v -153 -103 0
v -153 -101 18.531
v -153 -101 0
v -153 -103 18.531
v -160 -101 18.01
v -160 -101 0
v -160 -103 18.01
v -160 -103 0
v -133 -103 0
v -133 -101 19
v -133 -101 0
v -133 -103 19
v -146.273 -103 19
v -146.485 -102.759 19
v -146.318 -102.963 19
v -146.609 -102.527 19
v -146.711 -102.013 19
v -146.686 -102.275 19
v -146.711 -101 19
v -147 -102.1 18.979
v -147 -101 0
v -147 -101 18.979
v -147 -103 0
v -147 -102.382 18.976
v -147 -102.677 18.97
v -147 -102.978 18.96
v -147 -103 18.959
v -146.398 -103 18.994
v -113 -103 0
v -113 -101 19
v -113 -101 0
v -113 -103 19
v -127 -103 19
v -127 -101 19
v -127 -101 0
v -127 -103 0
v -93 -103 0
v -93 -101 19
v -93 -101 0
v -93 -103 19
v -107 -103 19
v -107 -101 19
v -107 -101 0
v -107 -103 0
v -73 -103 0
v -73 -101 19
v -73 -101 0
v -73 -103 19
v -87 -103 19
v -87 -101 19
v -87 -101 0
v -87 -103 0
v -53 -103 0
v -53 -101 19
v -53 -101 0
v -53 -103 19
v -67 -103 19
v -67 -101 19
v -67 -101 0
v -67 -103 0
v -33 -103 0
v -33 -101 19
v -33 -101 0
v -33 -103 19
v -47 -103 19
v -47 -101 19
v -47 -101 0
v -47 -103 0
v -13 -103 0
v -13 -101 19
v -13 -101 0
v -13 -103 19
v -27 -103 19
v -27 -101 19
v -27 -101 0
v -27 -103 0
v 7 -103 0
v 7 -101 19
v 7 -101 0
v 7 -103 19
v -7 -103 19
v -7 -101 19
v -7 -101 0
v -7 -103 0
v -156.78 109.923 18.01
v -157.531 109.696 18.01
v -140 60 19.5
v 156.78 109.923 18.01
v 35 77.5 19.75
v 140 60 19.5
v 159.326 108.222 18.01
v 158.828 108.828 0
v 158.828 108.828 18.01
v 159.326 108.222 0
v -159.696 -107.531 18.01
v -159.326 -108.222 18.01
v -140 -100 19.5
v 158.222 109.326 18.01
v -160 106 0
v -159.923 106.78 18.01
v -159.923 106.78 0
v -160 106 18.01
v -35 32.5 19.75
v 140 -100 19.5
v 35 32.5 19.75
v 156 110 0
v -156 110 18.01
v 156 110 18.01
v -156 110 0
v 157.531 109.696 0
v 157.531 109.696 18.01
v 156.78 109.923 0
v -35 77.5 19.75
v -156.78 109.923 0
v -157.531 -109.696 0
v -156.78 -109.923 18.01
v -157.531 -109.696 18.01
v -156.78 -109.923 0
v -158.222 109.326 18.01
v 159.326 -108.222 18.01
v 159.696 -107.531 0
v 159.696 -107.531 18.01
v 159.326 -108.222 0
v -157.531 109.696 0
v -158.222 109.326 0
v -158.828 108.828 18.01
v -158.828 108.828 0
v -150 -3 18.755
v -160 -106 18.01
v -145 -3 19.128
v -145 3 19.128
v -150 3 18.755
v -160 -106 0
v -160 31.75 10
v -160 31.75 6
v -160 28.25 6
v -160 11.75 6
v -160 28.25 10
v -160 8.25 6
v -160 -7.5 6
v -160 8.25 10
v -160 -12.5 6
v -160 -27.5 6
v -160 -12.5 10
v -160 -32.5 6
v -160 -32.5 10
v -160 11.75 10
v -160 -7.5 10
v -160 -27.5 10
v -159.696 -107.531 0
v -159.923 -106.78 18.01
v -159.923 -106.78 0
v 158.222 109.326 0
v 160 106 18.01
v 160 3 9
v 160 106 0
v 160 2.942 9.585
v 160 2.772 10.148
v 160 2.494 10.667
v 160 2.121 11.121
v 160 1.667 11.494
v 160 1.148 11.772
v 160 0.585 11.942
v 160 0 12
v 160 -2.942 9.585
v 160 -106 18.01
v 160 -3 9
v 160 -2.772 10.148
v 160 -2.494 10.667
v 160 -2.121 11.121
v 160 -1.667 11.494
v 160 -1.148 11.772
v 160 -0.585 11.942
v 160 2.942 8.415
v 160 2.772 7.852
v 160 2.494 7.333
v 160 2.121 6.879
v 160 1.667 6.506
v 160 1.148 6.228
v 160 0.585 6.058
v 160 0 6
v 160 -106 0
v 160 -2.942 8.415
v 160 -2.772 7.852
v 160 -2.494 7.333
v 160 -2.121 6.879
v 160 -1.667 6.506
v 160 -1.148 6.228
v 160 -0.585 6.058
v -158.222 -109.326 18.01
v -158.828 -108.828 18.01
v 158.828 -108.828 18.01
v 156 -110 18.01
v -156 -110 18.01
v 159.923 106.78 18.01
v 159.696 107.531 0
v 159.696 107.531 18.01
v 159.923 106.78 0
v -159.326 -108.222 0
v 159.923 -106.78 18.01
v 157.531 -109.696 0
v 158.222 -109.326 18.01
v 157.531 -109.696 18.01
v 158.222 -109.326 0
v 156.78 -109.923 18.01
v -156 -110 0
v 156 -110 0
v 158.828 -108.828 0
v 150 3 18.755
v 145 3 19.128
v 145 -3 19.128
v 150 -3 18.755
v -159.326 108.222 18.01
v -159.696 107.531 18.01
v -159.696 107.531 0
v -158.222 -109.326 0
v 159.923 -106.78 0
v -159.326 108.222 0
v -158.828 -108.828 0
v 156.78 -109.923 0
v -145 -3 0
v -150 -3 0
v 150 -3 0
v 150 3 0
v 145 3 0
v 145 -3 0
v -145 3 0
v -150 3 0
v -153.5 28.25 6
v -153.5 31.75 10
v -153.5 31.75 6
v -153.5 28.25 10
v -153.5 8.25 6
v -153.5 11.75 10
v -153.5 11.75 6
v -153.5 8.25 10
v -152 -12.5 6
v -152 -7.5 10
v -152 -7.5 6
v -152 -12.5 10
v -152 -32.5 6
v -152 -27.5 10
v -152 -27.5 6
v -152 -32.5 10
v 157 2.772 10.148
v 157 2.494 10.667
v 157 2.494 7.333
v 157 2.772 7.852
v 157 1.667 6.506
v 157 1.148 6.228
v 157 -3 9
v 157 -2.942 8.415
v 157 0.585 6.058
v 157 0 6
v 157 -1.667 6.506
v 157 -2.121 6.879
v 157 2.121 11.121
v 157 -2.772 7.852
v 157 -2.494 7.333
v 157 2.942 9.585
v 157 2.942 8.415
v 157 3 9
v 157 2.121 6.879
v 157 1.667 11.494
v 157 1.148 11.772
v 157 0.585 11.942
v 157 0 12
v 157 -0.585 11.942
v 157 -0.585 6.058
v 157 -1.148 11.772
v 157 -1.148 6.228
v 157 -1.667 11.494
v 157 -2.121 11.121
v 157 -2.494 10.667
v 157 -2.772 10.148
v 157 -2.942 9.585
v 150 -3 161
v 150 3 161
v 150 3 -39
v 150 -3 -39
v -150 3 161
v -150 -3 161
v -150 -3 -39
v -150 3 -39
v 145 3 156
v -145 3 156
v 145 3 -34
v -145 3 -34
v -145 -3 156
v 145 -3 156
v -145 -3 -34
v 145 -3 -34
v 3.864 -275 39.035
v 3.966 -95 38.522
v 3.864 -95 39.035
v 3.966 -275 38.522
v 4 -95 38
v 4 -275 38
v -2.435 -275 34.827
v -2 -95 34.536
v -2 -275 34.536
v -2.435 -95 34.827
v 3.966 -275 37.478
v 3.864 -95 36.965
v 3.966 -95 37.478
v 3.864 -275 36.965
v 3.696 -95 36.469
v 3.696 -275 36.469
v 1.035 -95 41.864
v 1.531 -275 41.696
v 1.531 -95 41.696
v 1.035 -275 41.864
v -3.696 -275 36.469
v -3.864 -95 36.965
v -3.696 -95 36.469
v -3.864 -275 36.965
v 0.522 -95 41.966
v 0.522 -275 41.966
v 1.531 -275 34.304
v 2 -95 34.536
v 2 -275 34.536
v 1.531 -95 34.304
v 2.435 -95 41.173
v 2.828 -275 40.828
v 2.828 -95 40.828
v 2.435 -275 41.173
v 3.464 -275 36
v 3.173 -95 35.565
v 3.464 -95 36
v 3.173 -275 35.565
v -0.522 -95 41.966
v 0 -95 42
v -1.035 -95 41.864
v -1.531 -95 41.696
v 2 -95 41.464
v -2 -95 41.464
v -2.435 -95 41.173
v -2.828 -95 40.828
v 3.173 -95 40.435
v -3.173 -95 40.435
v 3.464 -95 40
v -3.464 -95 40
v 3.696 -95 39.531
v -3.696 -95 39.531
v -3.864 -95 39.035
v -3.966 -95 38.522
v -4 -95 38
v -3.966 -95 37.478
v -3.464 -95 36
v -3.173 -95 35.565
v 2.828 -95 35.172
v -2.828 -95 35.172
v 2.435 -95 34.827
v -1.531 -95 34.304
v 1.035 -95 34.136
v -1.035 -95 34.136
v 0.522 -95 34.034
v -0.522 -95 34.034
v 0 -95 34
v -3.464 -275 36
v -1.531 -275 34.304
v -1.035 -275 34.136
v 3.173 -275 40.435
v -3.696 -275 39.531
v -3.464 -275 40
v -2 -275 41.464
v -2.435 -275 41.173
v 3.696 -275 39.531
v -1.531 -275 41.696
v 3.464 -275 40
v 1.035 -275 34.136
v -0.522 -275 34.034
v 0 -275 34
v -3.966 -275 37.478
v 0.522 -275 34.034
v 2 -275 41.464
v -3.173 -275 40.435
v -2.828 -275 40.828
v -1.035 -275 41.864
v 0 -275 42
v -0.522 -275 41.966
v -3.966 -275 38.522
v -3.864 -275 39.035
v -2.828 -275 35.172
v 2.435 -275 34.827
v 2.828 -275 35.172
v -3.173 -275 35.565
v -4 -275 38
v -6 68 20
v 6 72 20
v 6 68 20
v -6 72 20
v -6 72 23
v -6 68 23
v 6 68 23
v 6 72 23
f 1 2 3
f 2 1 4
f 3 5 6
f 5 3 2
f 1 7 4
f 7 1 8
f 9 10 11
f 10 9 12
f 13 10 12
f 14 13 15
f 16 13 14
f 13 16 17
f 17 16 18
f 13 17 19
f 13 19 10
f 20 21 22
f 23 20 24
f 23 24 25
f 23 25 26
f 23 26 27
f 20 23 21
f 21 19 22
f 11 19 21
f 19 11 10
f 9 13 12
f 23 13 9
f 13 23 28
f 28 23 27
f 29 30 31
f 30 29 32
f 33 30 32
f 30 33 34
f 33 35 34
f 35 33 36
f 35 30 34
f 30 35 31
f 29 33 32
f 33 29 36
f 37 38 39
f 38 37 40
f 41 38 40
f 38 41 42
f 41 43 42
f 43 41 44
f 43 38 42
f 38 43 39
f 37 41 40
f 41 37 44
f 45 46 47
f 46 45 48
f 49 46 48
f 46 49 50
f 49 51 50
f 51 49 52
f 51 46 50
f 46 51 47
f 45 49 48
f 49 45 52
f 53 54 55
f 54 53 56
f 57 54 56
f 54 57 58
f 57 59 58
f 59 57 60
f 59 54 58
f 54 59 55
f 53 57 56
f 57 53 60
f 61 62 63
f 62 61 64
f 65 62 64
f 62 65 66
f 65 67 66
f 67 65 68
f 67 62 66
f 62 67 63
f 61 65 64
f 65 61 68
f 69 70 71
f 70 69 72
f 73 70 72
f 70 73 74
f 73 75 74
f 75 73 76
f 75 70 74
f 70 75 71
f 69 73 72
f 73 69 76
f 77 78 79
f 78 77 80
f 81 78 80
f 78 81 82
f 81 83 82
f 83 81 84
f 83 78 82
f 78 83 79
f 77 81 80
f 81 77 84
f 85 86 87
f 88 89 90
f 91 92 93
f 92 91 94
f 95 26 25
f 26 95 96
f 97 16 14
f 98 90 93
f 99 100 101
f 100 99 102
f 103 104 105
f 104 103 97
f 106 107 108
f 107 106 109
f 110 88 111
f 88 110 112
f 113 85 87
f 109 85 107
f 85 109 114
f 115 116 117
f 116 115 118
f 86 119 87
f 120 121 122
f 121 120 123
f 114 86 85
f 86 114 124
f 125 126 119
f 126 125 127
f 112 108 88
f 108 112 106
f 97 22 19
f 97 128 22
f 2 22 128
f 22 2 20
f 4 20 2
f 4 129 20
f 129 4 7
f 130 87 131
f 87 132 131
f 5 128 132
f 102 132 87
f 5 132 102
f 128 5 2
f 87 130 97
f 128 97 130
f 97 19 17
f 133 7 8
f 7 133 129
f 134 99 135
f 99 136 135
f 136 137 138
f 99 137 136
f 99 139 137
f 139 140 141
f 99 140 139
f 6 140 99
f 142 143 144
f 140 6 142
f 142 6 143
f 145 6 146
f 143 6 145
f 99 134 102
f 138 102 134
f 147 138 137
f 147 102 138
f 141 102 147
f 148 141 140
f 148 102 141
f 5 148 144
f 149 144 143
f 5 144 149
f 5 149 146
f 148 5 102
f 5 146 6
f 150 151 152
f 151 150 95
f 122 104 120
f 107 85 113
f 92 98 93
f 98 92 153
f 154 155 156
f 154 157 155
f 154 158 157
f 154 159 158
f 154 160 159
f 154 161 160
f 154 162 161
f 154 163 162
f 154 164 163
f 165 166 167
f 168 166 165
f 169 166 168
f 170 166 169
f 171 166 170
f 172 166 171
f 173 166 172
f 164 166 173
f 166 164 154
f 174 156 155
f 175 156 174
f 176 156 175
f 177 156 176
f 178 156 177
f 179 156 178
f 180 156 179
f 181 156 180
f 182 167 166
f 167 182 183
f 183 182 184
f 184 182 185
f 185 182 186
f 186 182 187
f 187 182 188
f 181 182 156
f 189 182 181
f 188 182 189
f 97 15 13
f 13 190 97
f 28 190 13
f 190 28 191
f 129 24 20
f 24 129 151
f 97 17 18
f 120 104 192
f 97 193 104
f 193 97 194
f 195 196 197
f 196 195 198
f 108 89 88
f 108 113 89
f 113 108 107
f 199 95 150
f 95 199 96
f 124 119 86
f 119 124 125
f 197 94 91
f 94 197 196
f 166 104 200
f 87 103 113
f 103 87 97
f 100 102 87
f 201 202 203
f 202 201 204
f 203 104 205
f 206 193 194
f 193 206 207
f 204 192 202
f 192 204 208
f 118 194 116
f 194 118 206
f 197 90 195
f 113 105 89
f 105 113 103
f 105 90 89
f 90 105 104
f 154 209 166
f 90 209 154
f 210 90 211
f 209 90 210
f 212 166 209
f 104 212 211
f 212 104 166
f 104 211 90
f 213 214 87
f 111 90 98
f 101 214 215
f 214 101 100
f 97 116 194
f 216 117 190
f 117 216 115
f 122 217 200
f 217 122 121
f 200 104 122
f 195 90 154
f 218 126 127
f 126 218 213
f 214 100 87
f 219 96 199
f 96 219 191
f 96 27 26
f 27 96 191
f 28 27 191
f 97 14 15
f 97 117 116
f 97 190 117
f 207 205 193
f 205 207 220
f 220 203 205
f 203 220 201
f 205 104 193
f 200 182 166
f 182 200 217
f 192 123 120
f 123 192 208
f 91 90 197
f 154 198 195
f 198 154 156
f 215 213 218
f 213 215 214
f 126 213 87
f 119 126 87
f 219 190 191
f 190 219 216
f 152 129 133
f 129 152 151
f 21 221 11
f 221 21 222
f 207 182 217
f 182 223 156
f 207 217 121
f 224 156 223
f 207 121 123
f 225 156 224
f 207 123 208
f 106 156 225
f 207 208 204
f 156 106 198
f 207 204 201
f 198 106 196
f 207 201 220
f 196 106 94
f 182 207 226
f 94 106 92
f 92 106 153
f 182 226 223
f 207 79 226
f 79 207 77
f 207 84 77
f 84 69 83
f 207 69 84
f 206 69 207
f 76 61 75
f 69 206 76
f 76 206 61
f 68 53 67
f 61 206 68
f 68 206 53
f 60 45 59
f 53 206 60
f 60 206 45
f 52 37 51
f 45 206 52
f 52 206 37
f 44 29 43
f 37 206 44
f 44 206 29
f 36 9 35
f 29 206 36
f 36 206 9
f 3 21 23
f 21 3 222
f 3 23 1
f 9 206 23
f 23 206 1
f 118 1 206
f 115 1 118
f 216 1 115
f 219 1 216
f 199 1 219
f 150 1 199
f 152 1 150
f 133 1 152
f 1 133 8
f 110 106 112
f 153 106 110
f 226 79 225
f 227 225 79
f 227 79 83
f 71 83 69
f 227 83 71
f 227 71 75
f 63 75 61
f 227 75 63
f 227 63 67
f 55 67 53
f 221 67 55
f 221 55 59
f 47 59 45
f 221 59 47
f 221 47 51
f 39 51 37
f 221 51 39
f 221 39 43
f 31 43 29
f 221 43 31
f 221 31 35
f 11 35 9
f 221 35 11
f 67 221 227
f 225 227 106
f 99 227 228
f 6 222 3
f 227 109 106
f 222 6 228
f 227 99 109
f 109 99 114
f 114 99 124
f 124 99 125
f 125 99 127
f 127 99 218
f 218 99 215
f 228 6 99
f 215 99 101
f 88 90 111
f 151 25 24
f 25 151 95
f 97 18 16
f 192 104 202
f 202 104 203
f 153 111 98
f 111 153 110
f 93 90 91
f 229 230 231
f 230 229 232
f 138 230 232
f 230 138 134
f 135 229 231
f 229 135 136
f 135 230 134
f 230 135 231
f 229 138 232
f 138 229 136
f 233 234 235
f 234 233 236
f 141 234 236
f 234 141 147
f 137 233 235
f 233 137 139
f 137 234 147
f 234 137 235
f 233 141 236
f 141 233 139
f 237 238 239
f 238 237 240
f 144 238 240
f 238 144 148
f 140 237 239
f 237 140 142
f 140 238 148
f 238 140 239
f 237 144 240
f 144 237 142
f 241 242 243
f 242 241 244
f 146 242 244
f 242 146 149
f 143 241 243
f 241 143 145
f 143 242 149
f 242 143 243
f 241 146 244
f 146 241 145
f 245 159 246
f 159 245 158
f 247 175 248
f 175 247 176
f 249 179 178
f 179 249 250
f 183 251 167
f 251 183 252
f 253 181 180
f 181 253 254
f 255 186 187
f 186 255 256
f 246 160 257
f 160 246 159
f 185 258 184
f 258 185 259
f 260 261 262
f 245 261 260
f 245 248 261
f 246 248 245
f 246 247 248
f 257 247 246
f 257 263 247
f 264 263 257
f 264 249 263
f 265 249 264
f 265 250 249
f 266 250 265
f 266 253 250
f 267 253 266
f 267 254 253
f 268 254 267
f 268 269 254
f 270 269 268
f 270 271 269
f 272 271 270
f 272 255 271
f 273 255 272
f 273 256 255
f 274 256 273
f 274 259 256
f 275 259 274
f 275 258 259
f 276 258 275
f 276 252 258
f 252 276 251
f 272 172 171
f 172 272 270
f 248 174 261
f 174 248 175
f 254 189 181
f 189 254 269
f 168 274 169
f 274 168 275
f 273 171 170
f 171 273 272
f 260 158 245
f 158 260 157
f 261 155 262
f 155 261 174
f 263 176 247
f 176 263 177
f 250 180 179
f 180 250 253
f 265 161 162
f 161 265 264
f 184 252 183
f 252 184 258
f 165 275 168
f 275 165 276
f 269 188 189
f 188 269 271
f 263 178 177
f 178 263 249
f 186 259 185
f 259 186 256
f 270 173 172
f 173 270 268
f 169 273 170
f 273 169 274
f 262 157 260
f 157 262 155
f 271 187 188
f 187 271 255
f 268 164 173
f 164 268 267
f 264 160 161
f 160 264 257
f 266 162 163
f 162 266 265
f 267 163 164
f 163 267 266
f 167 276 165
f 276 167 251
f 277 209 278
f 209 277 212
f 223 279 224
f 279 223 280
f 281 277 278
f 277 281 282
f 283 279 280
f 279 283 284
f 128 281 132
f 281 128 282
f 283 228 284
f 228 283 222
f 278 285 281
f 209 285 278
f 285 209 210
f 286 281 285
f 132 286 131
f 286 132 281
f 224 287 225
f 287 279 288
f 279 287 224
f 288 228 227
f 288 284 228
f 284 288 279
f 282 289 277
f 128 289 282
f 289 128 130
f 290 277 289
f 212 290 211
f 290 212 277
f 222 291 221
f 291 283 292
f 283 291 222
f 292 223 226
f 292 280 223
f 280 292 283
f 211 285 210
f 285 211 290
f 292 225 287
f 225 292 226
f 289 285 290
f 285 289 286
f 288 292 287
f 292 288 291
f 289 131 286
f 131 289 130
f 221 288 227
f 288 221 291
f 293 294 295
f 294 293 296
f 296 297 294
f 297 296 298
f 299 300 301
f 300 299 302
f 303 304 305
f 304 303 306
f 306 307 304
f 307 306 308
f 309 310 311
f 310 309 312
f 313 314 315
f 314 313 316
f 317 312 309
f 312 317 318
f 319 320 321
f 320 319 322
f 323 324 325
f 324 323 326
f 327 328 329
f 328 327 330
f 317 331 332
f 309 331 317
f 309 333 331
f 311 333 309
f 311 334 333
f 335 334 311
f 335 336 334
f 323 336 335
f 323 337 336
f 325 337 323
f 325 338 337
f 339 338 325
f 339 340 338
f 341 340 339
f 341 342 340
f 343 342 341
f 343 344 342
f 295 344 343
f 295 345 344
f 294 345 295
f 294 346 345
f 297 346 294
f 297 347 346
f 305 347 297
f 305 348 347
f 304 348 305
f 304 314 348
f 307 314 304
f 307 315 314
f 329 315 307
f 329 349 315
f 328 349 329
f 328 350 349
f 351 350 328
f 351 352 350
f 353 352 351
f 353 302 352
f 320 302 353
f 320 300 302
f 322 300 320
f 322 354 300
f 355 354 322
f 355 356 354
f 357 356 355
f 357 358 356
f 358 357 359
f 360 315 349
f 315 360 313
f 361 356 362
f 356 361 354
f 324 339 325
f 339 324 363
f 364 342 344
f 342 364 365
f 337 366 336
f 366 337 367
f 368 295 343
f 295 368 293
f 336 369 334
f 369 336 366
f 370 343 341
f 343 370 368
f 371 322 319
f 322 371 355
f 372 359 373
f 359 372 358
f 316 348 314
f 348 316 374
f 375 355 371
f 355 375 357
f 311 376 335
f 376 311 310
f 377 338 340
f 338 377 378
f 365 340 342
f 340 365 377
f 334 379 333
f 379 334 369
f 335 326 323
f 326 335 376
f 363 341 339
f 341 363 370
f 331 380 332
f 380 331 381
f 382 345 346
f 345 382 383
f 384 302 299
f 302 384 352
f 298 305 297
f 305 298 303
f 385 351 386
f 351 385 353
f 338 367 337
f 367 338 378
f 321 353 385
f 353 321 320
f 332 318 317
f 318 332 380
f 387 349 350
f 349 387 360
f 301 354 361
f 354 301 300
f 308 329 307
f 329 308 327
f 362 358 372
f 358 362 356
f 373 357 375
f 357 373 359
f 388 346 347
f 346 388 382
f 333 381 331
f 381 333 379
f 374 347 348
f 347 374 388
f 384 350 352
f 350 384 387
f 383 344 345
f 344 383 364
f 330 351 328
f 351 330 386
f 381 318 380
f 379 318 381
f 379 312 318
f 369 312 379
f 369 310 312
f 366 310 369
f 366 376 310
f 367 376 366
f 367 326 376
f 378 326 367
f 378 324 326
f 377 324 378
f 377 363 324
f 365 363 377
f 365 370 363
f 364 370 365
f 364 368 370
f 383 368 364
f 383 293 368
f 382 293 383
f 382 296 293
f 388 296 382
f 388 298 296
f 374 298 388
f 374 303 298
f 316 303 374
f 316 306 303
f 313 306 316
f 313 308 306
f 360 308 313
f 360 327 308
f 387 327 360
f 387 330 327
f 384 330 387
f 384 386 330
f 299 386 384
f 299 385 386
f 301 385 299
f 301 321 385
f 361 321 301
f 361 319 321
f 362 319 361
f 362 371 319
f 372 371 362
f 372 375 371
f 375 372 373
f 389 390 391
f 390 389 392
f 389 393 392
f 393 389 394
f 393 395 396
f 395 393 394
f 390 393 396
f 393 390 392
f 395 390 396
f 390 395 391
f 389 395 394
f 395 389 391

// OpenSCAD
// file: common/labels.scad
// Label zones for video explanation
module label_zone(name) {
  // placeholder for annotation in renders
  children();
}
// file: common/branding.scad
module gunnch_badge() {
  linear_extrude(badge_h) translate([0,0,0]) square([badge_w, badge_w/3], center=true);
}
// file: common/ports.scad
module usb_c_cutout() {
  translate([0,0,-1]) cube([9, 3.5, wall+2], center=true);
}
module usb_a_cutout() {
  translate([0,0,-1]) cube([12, 5, wall+2], center=true);
}
module audio_3_5_cutout() {
  translate([0,0,-1]) cylinder(h=wall+2, d=6, $fn=32);
}
// file: common/dimensions.scad
// Shared dimensions — EVT-0 concept only
wall = 2;
corner_r = 4;
badge_w = 12;
badge_h = 3;
// file: student_14_5/student_14_5_concept.scad
include <../common/dimensions.scad>
include <../common/ports.scad>
include <../common/branding.scad>

base_l=320; base_w=220; base_h=18;
screen_l=300; screen_w=200; screen_t=6;

module student_base() {
  difference() {
    hull() {
      translate([0,0,base_h/2]) minkowski() {
        cube([base_l-2*corner_r, base_w-2*corner_r, base_h], center=true);
        cylinder(r=corner_r, h=0.01, $fn=32);
      }
      // keyboard deck
      translate([0,-20,base_h]) cube([base_l-40, base_w-60, 3], center=true);
      // trackpad
      translate([0,55,base_h+1]) cube([70,45,1.5], center=true);
    }
    // vent slots
    for (i=[-4:4]) translate([-80+i*20, -base_w/2+8, base_h/2]) cube([14, 2, base_h+2], center=true);
    // ports left
    translate([-base_l/2+2, 30, base_h/2]) usb_c_cutout();
    translate([-base_l/2+2, 10, base_h/2]) usb_c_cutout();
    translate([-base_l/2+2, -10, base_h/2]) usb_a_cutout();
    translate([-base_l/2+2, -30, base_h/2]) usb_a_cutout();
    translate([base_l/2-2, 0, base_h/2]) rotate([0,90,0]) audio_3_5_cutout();
  }
}

module student_screen() {
  difference() {
    translate([0,-base_w/2+screen_w/2+10, base_h+screen_t/2+40]) cube([screen_l, screen_t, screen_w], center=true);
    translate([0,-base_w/2+screen_w/2+10, base_h+screen_t/2+40]) cube([screen_l-10, screen_t+2, screen_w-10], center=true);
  }
  // hinge
  translate([0,-base_w/2+15, base_h+20]) rotate([90,0,0]) cylinder(h=screen_w-20, r=4, $fn=48);
}

union() {
  student_base();
  student_screen();
  translate([0,70,base_h+2]) gunnch_badge();
}
// file: common_modules.scad
// EVT-1 common modules — dimensions/tolerances are placeholders, not final mechanical drawings
include <common/dimensions.scad>
include <common/ports.scad>
include <common/branding.scad>
include <common/labels.scad>

module screw_boss(r=2.5, h=6) { cylinder(r=r, h=h, $fn=24); }
module service_panel(w=40, h=20, t=2) { cube([w, h, t]); }
module cooling_vent(w=60, slots=5) {
  for (i=[0:slots-1]) translate([i*12-w/2, 0, 0]) cube([8, 2, 4], center=true);
}
module battery_compartment(w=80, d=60, h=8) { cube([w, d, h], center=true); }
module label_zone(w=30, h=10) { translate([0,0,0.1]) cube([w, h, 0.2]); }
// main file
// EVT-1 placeholder — dimensions/tolerances not final mechanical drawings
// Re-exports concept model from student_14_5/student_14_5_concept.scad
include <common_modules.scad>
include <student_14_5/student_14_5_concept.scad>
